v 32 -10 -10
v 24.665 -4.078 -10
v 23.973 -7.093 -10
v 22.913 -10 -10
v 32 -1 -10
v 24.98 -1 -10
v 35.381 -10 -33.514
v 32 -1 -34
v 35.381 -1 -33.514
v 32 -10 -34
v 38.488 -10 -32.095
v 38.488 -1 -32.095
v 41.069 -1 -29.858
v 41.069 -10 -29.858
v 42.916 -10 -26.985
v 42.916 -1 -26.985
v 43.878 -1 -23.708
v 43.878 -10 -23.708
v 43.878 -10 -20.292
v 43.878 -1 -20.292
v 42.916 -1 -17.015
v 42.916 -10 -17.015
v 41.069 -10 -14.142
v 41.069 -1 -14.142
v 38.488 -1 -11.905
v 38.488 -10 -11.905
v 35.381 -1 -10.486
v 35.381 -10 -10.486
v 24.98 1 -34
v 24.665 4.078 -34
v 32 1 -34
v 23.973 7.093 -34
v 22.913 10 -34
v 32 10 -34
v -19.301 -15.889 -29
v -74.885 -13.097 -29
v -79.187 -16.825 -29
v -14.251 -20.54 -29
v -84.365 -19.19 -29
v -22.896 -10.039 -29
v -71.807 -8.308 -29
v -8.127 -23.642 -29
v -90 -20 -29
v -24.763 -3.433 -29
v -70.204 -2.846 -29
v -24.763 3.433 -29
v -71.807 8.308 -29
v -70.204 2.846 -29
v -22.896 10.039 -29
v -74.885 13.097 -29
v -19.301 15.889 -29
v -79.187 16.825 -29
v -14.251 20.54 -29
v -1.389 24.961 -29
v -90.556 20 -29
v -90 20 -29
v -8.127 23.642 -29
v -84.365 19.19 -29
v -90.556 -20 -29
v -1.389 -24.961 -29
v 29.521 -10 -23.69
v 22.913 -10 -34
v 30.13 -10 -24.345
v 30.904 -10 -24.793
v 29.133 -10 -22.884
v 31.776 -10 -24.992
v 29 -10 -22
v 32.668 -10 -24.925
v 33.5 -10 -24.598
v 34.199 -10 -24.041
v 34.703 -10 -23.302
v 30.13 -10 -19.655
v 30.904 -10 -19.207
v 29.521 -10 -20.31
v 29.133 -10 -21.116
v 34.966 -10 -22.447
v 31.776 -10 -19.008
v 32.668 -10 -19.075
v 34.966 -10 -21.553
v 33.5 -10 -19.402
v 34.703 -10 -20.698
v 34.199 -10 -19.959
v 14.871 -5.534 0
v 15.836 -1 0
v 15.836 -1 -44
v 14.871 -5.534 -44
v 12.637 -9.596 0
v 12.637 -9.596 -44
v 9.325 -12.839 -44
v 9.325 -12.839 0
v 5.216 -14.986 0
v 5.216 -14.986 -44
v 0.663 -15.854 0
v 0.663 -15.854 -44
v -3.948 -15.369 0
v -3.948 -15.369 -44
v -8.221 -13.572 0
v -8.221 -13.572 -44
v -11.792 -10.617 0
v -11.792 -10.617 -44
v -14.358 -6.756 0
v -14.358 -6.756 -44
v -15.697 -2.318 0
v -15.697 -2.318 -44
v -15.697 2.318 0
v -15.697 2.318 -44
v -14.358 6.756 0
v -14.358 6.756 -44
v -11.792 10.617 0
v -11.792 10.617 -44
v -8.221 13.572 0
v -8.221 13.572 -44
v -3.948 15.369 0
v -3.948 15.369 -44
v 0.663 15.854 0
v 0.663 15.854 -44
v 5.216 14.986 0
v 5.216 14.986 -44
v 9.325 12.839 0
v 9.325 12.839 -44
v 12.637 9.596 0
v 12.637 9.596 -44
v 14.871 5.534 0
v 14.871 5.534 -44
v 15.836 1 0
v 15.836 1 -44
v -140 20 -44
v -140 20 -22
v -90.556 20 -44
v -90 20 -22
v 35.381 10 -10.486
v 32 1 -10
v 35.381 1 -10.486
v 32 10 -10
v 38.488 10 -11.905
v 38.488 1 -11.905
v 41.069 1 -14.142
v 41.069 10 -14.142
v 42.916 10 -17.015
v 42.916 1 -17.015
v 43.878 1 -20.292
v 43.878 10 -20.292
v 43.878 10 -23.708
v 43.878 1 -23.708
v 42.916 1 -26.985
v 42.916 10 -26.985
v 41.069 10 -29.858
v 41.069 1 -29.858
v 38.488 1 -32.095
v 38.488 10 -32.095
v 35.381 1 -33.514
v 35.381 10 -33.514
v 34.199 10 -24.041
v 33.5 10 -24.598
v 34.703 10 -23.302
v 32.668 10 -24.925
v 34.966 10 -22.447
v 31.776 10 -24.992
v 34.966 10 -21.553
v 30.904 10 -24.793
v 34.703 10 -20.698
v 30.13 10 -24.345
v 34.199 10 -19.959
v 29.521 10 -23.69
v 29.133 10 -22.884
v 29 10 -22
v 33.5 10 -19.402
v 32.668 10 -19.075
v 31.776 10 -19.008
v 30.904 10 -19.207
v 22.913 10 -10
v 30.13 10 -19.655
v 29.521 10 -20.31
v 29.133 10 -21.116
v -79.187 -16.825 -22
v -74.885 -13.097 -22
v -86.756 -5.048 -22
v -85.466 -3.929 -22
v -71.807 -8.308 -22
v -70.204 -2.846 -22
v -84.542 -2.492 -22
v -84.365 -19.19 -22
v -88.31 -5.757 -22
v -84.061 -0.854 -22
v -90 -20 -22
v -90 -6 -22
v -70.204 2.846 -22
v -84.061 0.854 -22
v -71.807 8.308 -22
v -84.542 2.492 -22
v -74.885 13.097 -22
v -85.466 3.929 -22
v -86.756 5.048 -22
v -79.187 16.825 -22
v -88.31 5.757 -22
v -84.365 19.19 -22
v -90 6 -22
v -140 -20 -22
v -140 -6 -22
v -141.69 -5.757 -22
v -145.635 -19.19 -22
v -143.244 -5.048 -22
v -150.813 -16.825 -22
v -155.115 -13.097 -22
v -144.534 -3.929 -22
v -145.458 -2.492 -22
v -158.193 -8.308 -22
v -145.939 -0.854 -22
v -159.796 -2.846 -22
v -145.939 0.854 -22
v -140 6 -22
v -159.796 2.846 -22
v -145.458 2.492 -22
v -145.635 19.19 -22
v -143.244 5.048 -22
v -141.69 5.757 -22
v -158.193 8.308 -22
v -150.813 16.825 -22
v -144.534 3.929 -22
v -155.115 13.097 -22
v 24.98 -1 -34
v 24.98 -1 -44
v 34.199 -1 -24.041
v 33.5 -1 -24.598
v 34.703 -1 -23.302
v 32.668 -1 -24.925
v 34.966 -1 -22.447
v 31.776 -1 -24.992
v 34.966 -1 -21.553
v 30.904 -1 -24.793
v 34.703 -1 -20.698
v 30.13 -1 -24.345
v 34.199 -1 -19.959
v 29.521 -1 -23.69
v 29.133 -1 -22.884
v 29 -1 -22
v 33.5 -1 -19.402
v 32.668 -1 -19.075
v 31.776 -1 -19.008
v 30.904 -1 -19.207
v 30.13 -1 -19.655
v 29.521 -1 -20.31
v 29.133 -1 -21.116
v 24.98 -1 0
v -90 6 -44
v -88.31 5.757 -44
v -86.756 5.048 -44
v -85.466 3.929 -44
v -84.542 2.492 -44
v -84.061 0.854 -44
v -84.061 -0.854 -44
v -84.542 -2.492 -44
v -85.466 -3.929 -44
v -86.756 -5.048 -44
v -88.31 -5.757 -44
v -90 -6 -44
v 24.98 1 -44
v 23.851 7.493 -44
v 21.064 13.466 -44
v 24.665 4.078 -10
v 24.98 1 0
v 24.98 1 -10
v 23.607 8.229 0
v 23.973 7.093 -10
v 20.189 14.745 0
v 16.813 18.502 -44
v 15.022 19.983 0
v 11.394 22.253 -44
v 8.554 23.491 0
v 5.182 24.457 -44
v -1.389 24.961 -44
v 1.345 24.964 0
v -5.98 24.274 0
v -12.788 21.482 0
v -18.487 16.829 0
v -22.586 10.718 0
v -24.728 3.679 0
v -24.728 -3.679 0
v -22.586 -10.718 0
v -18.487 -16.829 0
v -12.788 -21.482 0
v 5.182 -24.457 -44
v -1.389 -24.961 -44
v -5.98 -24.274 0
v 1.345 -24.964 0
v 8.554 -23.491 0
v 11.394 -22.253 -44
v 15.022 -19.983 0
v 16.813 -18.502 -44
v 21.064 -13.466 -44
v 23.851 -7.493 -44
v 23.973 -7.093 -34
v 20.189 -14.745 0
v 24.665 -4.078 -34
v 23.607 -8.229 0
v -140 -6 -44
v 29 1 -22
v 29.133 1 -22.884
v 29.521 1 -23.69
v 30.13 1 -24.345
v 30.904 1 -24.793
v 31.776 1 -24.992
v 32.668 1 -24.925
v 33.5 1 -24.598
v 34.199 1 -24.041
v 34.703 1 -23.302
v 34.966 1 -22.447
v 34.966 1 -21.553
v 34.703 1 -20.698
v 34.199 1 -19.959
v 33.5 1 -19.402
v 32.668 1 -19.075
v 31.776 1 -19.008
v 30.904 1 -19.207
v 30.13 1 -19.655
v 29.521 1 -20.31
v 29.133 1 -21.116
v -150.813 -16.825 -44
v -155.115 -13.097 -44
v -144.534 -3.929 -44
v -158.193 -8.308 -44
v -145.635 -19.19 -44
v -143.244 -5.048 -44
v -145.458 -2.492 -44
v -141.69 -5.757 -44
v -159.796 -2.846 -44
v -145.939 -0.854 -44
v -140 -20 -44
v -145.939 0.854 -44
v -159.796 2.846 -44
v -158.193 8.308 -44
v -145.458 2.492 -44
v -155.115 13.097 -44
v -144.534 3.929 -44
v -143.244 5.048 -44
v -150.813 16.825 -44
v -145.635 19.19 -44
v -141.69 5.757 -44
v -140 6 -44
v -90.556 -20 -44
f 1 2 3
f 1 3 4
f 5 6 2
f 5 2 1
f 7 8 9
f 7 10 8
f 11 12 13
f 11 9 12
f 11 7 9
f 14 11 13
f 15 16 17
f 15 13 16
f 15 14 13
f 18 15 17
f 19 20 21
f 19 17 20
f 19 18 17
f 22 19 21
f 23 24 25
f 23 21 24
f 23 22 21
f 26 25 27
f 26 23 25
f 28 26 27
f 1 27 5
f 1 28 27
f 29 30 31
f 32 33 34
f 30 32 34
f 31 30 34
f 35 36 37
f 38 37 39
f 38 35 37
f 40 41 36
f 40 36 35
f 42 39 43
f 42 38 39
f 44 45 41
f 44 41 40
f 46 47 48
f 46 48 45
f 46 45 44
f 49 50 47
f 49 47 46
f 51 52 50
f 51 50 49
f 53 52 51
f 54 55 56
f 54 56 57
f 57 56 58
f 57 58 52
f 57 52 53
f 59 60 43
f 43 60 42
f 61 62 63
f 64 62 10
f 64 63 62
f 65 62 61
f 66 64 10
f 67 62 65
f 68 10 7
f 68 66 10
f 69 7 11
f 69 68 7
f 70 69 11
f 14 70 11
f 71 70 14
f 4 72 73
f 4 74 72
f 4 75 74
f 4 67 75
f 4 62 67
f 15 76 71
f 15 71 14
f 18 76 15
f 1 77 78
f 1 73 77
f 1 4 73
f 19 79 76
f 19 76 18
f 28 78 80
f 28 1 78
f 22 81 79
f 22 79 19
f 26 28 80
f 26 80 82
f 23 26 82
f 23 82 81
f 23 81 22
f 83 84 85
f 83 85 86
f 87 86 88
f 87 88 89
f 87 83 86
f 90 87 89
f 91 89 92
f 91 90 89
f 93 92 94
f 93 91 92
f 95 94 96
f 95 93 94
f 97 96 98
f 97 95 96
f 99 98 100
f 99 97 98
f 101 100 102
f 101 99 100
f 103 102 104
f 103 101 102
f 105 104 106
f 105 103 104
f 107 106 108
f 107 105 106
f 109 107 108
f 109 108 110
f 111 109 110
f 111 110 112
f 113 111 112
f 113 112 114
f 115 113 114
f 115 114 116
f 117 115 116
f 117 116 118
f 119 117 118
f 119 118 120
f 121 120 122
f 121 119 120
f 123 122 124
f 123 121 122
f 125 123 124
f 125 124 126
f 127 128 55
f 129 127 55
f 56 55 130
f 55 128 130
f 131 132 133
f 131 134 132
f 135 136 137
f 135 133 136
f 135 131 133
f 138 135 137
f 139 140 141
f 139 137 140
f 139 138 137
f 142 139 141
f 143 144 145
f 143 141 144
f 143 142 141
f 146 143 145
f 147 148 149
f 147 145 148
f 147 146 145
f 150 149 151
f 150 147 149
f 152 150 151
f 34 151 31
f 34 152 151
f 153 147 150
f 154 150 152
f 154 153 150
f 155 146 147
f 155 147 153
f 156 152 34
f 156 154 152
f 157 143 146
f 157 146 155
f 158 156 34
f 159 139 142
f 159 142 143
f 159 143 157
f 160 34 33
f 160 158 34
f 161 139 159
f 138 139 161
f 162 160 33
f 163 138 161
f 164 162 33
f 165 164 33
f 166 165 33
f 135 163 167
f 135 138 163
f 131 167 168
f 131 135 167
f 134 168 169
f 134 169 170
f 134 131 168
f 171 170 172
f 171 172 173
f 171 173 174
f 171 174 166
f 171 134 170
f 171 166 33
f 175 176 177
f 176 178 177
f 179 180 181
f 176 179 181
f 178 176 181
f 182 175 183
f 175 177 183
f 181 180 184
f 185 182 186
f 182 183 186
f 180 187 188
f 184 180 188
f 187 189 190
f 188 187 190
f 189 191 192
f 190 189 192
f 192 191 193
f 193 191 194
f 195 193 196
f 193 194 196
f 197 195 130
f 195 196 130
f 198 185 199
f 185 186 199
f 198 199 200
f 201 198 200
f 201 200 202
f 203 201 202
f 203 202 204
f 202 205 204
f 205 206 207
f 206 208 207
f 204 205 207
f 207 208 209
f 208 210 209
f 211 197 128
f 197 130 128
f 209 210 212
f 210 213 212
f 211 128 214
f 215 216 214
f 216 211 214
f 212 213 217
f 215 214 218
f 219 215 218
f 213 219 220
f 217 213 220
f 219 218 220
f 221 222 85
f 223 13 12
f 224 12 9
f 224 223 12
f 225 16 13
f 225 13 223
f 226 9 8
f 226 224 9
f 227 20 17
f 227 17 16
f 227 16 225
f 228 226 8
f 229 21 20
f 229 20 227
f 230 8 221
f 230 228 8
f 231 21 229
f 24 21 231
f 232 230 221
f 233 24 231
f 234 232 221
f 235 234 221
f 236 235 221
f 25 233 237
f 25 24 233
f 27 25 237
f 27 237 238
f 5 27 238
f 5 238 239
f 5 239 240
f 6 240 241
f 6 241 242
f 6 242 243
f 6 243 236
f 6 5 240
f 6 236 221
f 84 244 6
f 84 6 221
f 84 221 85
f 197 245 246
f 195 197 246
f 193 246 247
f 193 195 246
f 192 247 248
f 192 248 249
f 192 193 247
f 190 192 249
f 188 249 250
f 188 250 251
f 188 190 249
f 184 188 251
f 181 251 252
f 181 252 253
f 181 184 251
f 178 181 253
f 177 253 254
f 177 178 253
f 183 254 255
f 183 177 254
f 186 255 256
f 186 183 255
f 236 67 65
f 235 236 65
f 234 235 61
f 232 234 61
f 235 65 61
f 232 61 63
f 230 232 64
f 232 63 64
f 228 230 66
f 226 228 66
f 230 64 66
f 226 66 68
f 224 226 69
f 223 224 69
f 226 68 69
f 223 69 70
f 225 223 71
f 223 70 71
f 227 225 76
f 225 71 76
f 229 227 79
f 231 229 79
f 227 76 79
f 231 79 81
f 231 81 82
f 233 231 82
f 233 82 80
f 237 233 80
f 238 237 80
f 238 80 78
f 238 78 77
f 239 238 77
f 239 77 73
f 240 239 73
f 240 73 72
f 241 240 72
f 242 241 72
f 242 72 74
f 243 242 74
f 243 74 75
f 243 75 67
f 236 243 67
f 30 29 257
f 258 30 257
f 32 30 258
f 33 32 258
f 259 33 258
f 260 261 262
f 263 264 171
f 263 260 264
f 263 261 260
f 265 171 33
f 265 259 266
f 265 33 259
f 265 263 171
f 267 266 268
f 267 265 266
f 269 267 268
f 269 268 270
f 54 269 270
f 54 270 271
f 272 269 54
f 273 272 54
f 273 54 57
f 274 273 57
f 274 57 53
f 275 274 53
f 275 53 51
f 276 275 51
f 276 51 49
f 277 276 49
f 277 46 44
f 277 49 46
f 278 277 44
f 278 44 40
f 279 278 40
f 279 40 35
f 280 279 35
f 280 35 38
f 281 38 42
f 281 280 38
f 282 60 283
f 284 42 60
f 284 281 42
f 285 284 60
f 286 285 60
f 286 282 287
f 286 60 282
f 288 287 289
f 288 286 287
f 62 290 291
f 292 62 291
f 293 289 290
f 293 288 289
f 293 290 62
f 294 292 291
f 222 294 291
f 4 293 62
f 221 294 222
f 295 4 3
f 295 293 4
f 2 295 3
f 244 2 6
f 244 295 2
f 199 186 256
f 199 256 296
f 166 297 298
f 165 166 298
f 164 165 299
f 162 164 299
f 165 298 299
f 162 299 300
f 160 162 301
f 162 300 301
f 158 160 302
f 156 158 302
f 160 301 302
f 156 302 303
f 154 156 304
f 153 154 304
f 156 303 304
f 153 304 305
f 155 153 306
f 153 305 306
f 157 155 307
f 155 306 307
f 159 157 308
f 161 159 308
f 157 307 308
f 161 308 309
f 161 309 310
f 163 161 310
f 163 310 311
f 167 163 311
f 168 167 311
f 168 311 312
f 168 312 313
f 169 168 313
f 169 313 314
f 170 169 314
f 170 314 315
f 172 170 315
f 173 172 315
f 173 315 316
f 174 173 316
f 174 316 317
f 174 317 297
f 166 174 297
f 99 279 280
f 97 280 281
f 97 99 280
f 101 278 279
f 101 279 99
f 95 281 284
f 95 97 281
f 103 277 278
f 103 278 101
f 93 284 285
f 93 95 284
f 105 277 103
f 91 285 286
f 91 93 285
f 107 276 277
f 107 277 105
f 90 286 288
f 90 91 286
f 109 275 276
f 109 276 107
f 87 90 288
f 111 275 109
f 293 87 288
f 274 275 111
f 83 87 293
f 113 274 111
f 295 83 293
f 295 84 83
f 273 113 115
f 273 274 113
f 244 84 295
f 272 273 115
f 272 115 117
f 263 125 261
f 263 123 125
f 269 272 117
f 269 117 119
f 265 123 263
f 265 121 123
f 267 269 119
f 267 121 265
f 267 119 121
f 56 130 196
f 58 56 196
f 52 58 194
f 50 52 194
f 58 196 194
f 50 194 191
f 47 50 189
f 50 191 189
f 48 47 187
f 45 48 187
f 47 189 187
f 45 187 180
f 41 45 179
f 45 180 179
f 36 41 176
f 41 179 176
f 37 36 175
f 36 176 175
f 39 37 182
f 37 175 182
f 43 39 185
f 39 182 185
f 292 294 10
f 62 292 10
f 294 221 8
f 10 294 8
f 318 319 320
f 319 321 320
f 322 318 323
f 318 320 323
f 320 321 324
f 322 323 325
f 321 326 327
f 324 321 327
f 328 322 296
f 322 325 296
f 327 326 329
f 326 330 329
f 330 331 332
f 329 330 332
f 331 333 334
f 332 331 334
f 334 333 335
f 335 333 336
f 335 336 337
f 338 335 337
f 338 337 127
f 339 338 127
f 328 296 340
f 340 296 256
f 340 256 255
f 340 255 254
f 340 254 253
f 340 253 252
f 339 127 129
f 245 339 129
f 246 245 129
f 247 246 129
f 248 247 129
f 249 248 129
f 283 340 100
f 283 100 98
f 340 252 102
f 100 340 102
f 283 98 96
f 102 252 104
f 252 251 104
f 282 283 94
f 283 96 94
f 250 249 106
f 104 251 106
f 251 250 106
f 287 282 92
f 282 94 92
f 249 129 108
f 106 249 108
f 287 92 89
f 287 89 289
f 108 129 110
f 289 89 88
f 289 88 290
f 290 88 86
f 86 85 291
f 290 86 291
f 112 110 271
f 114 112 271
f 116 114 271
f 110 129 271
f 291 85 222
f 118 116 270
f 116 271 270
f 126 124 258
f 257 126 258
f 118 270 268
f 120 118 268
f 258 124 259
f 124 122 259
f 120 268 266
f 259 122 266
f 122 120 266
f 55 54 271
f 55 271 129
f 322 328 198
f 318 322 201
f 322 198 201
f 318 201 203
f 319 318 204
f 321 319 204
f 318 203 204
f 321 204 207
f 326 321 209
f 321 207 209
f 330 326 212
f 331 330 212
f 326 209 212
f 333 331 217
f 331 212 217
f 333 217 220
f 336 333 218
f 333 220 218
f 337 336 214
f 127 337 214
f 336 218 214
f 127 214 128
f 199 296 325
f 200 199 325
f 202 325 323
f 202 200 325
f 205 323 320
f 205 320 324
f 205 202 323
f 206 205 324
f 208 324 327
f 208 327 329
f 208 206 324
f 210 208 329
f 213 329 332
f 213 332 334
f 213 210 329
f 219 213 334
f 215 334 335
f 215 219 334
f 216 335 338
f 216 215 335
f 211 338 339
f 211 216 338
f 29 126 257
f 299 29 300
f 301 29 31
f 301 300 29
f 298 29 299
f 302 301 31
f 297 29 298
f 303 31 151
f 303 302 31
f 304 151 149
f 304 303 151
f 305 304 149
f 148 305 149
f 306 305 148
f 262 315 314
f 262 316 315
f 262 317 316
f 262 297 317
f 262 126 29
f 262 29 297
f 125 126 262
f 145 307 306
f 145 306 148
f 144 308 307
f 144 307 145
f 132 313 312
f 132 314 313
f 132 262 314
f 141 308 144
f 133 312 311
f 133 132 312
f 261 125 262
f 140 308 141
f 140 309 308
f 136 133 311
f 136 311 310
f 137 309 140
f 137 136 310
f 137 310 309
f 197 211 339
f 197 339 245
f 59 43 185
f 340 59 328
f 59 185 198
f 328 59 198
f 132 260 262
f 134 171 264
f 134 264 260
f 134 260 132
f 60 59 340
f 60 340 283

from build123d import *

# Parameters (mm, degrees)
BOSS_EXTRUDE1_DEPTH   = 44
BOSS_EXTRUDE2_START   = -10
BOSS_EXTRUDE2_DEPTH   = 24
BOSS_EXTRUDE3_START   = -22
BOSS_EXTRUDE3_DEPTH   = 22
BOSS_EXTRUDE4_START   = -29
BOSS_EXTRUDE4_DEPTH   = 15
FILLET1_RADIUS        = 12
FILLET1_LENGTH        = 9
FILLET2_RADIUS        = 12
FILLET2_LENGTH        = 9
F_6_0MM_DOWEL_HOLE1_D = 6


with BuildPart() as part:
    # Sketch1 → Boss-Extrude1 (new body)
    with BuildSketch(Plane.XY):
        with BuildLine():
            Line((15.835957699, 1), (24.979991994, 1))
            ThreePointArc((24.979991994, 1), (-25, 0), (24.979991994, -1))
            Line((24.979991994, -1), (15.835957699, -1))
            ThreePointArc((15.835957699, -1), (-15.8675, 0), (15.835957699, 1))
        make_face()
    extrude(amount=-BOSS_EXTRUDE1_DEPTH)

    # Sketch1<3> → Boss-Extrude2 (add)
    with BuildSketch(Plane.XY.offset(BOSS_EXTRUDE2_START)):
        with BuildLine():
            Line((44, 10), (22.912878475, 10))
            ThreePointArc((22.912878475, 10), (24.365585575, 5.596270148), (24.979991994, 1))
            Line((24.979991994, 1), (44, 1))
            Line((44, 1), (44, 10))
        make_face()
        with BuildLine():
            ThreePointArc((24.979991994, -1), (24.365585575, -5.596270148), (22.912878475, -10))
            Line((22.912878475, -10), (44, -10))
            Line((44, -10), (44, -1))
            Line((44, -1), (24.979991994, -1))
        make_face()
    extrude(amount=-BOSS_EXTRUDE2_DEPTH)



with BuildPart() as body_2:
    # Sketch1<4> → Boss-Extrude3 (new body)
    with BuildSketch(Plane.XY.offset(BOSS_EXTRUDE3_START)):
        with BuildLine():
            Line((-140, 20), (-90, 20))
            ThreePointArc((-90, 20), (-70, 0), (-90, -20))
            Line((-90, -20), (-140, -20))
            ThreePointArc((-140, -20), (-160, 0), (-140, 20))
        make_face()
        with BuildLine():
            Line((-140, 6), (-90, 6))
            ThreePointArc((-90, 6), (-84, 0), (-90, -6))
            Line((-90, -6), (-140, -6))
            ThreePointArc((-140, -6), (-146, 0), (-140, 6))
        make_face(mode=Mode.SUBTRACT)
    extrude(amount=-BOSS_EXTRUDE3_DEPTH)


with BuildPart() as part_1:
    add(part.part)

    add(body_2.part)  # Boss-Extrude4 merges body 2
    # Sketch1<5> → Boss-Extrude4 (add)
    with BuildSketch(Plane.XY.offset(BOSS_EXTRUDE4_START)):
        with BuildLine():
            Line((-1.388888889, 24.961389938), (-90.555984888, 20))
            Line((-90.555984888, 20), (-90, 20))
            ThreePointArc((-90, 20), (-70, 0), (-90, -20))
            Line((-90, -20), (-90.555984888, -20))
            Line((-90.555984888, -20), (-1.388888889, -24.961389938))
            ThreePointArc((-1.388888889, -24.961389938), (-25, 0), (-1.388888889, 24.961389938))
        make_face()
    extrude(amount=-BOSS_EXTRUDE4_DEPTH)

    # Fillet1: full round fillet: the end face becomes a half cylinder, R = half its width
    fillet1_face = Plane((44, 5.5, -22), x_dir=(0, 1, 0), z_dir=(1, 0, 0))  # on the end face: x along it, z out of the body
    fillet1_slab = fillet1_face.offset(-FILLET1_RADIUS / 2) * Box(FILLET1_LENGTH, 2 * FILLET1_RADIUS, FILLET1_RADIUS, mode=Mode.PRIVATE)  # the body's end, R deep
    fillet1_round = Plane((32, 5.5, -22), x_dir=(1, 0, 0), z_dir=(0, 1, 0)) * Cylinder(FILLET1_RADIUS, FILLET1_LENGTH, mode=Mode.PRIVATE)  # its axis R under the face
    add(fillet1_slab - fillet1_round, mode=Mode.SUBTRACT)

    # Fillet2: full round fillet: the end face becomes a half cylinder, R = half its width
    fillet2_face = Plane((44, -5.5, -22), x_dir=(0, -1, 0), z_dir=(1, 0, 0))  # on the end face: x along it, z out of the body
    fillet2_slab = fillet2_face.offset(-FILLET2_RADIUS / 2) * Box(FILLET2_LENGTH, 2 * FILLET2_RADIUS, FILLET2_RADIUS, mode=Mode.PRIVATE)  # the body's end, R deep
    fillet2_round = Plane((32, -5.5, -22), x_dir=(1, 0, 0), z_dir=(0, -1, 0)) * Cylinder(FILLET2_RADIUS, FILLET2_LENGTH, mode=Mode.PRIVATE)  # its axis R under the face
    add(fillet2_slab - fillet2_round, mode=Mode.SUBTRACT)

    # Ø6.0mm Dowel Hole1 (through all)
    with Locations(Plane(origin=(32, 10, -22), x_dir=(1, 0, 0), z_dir=(0, 1, 0))):
        with Locations((0, 0)):
            Hole(F_6_0MM_DOWEL_HOLE1_D / 2)


solid = part_1.part
